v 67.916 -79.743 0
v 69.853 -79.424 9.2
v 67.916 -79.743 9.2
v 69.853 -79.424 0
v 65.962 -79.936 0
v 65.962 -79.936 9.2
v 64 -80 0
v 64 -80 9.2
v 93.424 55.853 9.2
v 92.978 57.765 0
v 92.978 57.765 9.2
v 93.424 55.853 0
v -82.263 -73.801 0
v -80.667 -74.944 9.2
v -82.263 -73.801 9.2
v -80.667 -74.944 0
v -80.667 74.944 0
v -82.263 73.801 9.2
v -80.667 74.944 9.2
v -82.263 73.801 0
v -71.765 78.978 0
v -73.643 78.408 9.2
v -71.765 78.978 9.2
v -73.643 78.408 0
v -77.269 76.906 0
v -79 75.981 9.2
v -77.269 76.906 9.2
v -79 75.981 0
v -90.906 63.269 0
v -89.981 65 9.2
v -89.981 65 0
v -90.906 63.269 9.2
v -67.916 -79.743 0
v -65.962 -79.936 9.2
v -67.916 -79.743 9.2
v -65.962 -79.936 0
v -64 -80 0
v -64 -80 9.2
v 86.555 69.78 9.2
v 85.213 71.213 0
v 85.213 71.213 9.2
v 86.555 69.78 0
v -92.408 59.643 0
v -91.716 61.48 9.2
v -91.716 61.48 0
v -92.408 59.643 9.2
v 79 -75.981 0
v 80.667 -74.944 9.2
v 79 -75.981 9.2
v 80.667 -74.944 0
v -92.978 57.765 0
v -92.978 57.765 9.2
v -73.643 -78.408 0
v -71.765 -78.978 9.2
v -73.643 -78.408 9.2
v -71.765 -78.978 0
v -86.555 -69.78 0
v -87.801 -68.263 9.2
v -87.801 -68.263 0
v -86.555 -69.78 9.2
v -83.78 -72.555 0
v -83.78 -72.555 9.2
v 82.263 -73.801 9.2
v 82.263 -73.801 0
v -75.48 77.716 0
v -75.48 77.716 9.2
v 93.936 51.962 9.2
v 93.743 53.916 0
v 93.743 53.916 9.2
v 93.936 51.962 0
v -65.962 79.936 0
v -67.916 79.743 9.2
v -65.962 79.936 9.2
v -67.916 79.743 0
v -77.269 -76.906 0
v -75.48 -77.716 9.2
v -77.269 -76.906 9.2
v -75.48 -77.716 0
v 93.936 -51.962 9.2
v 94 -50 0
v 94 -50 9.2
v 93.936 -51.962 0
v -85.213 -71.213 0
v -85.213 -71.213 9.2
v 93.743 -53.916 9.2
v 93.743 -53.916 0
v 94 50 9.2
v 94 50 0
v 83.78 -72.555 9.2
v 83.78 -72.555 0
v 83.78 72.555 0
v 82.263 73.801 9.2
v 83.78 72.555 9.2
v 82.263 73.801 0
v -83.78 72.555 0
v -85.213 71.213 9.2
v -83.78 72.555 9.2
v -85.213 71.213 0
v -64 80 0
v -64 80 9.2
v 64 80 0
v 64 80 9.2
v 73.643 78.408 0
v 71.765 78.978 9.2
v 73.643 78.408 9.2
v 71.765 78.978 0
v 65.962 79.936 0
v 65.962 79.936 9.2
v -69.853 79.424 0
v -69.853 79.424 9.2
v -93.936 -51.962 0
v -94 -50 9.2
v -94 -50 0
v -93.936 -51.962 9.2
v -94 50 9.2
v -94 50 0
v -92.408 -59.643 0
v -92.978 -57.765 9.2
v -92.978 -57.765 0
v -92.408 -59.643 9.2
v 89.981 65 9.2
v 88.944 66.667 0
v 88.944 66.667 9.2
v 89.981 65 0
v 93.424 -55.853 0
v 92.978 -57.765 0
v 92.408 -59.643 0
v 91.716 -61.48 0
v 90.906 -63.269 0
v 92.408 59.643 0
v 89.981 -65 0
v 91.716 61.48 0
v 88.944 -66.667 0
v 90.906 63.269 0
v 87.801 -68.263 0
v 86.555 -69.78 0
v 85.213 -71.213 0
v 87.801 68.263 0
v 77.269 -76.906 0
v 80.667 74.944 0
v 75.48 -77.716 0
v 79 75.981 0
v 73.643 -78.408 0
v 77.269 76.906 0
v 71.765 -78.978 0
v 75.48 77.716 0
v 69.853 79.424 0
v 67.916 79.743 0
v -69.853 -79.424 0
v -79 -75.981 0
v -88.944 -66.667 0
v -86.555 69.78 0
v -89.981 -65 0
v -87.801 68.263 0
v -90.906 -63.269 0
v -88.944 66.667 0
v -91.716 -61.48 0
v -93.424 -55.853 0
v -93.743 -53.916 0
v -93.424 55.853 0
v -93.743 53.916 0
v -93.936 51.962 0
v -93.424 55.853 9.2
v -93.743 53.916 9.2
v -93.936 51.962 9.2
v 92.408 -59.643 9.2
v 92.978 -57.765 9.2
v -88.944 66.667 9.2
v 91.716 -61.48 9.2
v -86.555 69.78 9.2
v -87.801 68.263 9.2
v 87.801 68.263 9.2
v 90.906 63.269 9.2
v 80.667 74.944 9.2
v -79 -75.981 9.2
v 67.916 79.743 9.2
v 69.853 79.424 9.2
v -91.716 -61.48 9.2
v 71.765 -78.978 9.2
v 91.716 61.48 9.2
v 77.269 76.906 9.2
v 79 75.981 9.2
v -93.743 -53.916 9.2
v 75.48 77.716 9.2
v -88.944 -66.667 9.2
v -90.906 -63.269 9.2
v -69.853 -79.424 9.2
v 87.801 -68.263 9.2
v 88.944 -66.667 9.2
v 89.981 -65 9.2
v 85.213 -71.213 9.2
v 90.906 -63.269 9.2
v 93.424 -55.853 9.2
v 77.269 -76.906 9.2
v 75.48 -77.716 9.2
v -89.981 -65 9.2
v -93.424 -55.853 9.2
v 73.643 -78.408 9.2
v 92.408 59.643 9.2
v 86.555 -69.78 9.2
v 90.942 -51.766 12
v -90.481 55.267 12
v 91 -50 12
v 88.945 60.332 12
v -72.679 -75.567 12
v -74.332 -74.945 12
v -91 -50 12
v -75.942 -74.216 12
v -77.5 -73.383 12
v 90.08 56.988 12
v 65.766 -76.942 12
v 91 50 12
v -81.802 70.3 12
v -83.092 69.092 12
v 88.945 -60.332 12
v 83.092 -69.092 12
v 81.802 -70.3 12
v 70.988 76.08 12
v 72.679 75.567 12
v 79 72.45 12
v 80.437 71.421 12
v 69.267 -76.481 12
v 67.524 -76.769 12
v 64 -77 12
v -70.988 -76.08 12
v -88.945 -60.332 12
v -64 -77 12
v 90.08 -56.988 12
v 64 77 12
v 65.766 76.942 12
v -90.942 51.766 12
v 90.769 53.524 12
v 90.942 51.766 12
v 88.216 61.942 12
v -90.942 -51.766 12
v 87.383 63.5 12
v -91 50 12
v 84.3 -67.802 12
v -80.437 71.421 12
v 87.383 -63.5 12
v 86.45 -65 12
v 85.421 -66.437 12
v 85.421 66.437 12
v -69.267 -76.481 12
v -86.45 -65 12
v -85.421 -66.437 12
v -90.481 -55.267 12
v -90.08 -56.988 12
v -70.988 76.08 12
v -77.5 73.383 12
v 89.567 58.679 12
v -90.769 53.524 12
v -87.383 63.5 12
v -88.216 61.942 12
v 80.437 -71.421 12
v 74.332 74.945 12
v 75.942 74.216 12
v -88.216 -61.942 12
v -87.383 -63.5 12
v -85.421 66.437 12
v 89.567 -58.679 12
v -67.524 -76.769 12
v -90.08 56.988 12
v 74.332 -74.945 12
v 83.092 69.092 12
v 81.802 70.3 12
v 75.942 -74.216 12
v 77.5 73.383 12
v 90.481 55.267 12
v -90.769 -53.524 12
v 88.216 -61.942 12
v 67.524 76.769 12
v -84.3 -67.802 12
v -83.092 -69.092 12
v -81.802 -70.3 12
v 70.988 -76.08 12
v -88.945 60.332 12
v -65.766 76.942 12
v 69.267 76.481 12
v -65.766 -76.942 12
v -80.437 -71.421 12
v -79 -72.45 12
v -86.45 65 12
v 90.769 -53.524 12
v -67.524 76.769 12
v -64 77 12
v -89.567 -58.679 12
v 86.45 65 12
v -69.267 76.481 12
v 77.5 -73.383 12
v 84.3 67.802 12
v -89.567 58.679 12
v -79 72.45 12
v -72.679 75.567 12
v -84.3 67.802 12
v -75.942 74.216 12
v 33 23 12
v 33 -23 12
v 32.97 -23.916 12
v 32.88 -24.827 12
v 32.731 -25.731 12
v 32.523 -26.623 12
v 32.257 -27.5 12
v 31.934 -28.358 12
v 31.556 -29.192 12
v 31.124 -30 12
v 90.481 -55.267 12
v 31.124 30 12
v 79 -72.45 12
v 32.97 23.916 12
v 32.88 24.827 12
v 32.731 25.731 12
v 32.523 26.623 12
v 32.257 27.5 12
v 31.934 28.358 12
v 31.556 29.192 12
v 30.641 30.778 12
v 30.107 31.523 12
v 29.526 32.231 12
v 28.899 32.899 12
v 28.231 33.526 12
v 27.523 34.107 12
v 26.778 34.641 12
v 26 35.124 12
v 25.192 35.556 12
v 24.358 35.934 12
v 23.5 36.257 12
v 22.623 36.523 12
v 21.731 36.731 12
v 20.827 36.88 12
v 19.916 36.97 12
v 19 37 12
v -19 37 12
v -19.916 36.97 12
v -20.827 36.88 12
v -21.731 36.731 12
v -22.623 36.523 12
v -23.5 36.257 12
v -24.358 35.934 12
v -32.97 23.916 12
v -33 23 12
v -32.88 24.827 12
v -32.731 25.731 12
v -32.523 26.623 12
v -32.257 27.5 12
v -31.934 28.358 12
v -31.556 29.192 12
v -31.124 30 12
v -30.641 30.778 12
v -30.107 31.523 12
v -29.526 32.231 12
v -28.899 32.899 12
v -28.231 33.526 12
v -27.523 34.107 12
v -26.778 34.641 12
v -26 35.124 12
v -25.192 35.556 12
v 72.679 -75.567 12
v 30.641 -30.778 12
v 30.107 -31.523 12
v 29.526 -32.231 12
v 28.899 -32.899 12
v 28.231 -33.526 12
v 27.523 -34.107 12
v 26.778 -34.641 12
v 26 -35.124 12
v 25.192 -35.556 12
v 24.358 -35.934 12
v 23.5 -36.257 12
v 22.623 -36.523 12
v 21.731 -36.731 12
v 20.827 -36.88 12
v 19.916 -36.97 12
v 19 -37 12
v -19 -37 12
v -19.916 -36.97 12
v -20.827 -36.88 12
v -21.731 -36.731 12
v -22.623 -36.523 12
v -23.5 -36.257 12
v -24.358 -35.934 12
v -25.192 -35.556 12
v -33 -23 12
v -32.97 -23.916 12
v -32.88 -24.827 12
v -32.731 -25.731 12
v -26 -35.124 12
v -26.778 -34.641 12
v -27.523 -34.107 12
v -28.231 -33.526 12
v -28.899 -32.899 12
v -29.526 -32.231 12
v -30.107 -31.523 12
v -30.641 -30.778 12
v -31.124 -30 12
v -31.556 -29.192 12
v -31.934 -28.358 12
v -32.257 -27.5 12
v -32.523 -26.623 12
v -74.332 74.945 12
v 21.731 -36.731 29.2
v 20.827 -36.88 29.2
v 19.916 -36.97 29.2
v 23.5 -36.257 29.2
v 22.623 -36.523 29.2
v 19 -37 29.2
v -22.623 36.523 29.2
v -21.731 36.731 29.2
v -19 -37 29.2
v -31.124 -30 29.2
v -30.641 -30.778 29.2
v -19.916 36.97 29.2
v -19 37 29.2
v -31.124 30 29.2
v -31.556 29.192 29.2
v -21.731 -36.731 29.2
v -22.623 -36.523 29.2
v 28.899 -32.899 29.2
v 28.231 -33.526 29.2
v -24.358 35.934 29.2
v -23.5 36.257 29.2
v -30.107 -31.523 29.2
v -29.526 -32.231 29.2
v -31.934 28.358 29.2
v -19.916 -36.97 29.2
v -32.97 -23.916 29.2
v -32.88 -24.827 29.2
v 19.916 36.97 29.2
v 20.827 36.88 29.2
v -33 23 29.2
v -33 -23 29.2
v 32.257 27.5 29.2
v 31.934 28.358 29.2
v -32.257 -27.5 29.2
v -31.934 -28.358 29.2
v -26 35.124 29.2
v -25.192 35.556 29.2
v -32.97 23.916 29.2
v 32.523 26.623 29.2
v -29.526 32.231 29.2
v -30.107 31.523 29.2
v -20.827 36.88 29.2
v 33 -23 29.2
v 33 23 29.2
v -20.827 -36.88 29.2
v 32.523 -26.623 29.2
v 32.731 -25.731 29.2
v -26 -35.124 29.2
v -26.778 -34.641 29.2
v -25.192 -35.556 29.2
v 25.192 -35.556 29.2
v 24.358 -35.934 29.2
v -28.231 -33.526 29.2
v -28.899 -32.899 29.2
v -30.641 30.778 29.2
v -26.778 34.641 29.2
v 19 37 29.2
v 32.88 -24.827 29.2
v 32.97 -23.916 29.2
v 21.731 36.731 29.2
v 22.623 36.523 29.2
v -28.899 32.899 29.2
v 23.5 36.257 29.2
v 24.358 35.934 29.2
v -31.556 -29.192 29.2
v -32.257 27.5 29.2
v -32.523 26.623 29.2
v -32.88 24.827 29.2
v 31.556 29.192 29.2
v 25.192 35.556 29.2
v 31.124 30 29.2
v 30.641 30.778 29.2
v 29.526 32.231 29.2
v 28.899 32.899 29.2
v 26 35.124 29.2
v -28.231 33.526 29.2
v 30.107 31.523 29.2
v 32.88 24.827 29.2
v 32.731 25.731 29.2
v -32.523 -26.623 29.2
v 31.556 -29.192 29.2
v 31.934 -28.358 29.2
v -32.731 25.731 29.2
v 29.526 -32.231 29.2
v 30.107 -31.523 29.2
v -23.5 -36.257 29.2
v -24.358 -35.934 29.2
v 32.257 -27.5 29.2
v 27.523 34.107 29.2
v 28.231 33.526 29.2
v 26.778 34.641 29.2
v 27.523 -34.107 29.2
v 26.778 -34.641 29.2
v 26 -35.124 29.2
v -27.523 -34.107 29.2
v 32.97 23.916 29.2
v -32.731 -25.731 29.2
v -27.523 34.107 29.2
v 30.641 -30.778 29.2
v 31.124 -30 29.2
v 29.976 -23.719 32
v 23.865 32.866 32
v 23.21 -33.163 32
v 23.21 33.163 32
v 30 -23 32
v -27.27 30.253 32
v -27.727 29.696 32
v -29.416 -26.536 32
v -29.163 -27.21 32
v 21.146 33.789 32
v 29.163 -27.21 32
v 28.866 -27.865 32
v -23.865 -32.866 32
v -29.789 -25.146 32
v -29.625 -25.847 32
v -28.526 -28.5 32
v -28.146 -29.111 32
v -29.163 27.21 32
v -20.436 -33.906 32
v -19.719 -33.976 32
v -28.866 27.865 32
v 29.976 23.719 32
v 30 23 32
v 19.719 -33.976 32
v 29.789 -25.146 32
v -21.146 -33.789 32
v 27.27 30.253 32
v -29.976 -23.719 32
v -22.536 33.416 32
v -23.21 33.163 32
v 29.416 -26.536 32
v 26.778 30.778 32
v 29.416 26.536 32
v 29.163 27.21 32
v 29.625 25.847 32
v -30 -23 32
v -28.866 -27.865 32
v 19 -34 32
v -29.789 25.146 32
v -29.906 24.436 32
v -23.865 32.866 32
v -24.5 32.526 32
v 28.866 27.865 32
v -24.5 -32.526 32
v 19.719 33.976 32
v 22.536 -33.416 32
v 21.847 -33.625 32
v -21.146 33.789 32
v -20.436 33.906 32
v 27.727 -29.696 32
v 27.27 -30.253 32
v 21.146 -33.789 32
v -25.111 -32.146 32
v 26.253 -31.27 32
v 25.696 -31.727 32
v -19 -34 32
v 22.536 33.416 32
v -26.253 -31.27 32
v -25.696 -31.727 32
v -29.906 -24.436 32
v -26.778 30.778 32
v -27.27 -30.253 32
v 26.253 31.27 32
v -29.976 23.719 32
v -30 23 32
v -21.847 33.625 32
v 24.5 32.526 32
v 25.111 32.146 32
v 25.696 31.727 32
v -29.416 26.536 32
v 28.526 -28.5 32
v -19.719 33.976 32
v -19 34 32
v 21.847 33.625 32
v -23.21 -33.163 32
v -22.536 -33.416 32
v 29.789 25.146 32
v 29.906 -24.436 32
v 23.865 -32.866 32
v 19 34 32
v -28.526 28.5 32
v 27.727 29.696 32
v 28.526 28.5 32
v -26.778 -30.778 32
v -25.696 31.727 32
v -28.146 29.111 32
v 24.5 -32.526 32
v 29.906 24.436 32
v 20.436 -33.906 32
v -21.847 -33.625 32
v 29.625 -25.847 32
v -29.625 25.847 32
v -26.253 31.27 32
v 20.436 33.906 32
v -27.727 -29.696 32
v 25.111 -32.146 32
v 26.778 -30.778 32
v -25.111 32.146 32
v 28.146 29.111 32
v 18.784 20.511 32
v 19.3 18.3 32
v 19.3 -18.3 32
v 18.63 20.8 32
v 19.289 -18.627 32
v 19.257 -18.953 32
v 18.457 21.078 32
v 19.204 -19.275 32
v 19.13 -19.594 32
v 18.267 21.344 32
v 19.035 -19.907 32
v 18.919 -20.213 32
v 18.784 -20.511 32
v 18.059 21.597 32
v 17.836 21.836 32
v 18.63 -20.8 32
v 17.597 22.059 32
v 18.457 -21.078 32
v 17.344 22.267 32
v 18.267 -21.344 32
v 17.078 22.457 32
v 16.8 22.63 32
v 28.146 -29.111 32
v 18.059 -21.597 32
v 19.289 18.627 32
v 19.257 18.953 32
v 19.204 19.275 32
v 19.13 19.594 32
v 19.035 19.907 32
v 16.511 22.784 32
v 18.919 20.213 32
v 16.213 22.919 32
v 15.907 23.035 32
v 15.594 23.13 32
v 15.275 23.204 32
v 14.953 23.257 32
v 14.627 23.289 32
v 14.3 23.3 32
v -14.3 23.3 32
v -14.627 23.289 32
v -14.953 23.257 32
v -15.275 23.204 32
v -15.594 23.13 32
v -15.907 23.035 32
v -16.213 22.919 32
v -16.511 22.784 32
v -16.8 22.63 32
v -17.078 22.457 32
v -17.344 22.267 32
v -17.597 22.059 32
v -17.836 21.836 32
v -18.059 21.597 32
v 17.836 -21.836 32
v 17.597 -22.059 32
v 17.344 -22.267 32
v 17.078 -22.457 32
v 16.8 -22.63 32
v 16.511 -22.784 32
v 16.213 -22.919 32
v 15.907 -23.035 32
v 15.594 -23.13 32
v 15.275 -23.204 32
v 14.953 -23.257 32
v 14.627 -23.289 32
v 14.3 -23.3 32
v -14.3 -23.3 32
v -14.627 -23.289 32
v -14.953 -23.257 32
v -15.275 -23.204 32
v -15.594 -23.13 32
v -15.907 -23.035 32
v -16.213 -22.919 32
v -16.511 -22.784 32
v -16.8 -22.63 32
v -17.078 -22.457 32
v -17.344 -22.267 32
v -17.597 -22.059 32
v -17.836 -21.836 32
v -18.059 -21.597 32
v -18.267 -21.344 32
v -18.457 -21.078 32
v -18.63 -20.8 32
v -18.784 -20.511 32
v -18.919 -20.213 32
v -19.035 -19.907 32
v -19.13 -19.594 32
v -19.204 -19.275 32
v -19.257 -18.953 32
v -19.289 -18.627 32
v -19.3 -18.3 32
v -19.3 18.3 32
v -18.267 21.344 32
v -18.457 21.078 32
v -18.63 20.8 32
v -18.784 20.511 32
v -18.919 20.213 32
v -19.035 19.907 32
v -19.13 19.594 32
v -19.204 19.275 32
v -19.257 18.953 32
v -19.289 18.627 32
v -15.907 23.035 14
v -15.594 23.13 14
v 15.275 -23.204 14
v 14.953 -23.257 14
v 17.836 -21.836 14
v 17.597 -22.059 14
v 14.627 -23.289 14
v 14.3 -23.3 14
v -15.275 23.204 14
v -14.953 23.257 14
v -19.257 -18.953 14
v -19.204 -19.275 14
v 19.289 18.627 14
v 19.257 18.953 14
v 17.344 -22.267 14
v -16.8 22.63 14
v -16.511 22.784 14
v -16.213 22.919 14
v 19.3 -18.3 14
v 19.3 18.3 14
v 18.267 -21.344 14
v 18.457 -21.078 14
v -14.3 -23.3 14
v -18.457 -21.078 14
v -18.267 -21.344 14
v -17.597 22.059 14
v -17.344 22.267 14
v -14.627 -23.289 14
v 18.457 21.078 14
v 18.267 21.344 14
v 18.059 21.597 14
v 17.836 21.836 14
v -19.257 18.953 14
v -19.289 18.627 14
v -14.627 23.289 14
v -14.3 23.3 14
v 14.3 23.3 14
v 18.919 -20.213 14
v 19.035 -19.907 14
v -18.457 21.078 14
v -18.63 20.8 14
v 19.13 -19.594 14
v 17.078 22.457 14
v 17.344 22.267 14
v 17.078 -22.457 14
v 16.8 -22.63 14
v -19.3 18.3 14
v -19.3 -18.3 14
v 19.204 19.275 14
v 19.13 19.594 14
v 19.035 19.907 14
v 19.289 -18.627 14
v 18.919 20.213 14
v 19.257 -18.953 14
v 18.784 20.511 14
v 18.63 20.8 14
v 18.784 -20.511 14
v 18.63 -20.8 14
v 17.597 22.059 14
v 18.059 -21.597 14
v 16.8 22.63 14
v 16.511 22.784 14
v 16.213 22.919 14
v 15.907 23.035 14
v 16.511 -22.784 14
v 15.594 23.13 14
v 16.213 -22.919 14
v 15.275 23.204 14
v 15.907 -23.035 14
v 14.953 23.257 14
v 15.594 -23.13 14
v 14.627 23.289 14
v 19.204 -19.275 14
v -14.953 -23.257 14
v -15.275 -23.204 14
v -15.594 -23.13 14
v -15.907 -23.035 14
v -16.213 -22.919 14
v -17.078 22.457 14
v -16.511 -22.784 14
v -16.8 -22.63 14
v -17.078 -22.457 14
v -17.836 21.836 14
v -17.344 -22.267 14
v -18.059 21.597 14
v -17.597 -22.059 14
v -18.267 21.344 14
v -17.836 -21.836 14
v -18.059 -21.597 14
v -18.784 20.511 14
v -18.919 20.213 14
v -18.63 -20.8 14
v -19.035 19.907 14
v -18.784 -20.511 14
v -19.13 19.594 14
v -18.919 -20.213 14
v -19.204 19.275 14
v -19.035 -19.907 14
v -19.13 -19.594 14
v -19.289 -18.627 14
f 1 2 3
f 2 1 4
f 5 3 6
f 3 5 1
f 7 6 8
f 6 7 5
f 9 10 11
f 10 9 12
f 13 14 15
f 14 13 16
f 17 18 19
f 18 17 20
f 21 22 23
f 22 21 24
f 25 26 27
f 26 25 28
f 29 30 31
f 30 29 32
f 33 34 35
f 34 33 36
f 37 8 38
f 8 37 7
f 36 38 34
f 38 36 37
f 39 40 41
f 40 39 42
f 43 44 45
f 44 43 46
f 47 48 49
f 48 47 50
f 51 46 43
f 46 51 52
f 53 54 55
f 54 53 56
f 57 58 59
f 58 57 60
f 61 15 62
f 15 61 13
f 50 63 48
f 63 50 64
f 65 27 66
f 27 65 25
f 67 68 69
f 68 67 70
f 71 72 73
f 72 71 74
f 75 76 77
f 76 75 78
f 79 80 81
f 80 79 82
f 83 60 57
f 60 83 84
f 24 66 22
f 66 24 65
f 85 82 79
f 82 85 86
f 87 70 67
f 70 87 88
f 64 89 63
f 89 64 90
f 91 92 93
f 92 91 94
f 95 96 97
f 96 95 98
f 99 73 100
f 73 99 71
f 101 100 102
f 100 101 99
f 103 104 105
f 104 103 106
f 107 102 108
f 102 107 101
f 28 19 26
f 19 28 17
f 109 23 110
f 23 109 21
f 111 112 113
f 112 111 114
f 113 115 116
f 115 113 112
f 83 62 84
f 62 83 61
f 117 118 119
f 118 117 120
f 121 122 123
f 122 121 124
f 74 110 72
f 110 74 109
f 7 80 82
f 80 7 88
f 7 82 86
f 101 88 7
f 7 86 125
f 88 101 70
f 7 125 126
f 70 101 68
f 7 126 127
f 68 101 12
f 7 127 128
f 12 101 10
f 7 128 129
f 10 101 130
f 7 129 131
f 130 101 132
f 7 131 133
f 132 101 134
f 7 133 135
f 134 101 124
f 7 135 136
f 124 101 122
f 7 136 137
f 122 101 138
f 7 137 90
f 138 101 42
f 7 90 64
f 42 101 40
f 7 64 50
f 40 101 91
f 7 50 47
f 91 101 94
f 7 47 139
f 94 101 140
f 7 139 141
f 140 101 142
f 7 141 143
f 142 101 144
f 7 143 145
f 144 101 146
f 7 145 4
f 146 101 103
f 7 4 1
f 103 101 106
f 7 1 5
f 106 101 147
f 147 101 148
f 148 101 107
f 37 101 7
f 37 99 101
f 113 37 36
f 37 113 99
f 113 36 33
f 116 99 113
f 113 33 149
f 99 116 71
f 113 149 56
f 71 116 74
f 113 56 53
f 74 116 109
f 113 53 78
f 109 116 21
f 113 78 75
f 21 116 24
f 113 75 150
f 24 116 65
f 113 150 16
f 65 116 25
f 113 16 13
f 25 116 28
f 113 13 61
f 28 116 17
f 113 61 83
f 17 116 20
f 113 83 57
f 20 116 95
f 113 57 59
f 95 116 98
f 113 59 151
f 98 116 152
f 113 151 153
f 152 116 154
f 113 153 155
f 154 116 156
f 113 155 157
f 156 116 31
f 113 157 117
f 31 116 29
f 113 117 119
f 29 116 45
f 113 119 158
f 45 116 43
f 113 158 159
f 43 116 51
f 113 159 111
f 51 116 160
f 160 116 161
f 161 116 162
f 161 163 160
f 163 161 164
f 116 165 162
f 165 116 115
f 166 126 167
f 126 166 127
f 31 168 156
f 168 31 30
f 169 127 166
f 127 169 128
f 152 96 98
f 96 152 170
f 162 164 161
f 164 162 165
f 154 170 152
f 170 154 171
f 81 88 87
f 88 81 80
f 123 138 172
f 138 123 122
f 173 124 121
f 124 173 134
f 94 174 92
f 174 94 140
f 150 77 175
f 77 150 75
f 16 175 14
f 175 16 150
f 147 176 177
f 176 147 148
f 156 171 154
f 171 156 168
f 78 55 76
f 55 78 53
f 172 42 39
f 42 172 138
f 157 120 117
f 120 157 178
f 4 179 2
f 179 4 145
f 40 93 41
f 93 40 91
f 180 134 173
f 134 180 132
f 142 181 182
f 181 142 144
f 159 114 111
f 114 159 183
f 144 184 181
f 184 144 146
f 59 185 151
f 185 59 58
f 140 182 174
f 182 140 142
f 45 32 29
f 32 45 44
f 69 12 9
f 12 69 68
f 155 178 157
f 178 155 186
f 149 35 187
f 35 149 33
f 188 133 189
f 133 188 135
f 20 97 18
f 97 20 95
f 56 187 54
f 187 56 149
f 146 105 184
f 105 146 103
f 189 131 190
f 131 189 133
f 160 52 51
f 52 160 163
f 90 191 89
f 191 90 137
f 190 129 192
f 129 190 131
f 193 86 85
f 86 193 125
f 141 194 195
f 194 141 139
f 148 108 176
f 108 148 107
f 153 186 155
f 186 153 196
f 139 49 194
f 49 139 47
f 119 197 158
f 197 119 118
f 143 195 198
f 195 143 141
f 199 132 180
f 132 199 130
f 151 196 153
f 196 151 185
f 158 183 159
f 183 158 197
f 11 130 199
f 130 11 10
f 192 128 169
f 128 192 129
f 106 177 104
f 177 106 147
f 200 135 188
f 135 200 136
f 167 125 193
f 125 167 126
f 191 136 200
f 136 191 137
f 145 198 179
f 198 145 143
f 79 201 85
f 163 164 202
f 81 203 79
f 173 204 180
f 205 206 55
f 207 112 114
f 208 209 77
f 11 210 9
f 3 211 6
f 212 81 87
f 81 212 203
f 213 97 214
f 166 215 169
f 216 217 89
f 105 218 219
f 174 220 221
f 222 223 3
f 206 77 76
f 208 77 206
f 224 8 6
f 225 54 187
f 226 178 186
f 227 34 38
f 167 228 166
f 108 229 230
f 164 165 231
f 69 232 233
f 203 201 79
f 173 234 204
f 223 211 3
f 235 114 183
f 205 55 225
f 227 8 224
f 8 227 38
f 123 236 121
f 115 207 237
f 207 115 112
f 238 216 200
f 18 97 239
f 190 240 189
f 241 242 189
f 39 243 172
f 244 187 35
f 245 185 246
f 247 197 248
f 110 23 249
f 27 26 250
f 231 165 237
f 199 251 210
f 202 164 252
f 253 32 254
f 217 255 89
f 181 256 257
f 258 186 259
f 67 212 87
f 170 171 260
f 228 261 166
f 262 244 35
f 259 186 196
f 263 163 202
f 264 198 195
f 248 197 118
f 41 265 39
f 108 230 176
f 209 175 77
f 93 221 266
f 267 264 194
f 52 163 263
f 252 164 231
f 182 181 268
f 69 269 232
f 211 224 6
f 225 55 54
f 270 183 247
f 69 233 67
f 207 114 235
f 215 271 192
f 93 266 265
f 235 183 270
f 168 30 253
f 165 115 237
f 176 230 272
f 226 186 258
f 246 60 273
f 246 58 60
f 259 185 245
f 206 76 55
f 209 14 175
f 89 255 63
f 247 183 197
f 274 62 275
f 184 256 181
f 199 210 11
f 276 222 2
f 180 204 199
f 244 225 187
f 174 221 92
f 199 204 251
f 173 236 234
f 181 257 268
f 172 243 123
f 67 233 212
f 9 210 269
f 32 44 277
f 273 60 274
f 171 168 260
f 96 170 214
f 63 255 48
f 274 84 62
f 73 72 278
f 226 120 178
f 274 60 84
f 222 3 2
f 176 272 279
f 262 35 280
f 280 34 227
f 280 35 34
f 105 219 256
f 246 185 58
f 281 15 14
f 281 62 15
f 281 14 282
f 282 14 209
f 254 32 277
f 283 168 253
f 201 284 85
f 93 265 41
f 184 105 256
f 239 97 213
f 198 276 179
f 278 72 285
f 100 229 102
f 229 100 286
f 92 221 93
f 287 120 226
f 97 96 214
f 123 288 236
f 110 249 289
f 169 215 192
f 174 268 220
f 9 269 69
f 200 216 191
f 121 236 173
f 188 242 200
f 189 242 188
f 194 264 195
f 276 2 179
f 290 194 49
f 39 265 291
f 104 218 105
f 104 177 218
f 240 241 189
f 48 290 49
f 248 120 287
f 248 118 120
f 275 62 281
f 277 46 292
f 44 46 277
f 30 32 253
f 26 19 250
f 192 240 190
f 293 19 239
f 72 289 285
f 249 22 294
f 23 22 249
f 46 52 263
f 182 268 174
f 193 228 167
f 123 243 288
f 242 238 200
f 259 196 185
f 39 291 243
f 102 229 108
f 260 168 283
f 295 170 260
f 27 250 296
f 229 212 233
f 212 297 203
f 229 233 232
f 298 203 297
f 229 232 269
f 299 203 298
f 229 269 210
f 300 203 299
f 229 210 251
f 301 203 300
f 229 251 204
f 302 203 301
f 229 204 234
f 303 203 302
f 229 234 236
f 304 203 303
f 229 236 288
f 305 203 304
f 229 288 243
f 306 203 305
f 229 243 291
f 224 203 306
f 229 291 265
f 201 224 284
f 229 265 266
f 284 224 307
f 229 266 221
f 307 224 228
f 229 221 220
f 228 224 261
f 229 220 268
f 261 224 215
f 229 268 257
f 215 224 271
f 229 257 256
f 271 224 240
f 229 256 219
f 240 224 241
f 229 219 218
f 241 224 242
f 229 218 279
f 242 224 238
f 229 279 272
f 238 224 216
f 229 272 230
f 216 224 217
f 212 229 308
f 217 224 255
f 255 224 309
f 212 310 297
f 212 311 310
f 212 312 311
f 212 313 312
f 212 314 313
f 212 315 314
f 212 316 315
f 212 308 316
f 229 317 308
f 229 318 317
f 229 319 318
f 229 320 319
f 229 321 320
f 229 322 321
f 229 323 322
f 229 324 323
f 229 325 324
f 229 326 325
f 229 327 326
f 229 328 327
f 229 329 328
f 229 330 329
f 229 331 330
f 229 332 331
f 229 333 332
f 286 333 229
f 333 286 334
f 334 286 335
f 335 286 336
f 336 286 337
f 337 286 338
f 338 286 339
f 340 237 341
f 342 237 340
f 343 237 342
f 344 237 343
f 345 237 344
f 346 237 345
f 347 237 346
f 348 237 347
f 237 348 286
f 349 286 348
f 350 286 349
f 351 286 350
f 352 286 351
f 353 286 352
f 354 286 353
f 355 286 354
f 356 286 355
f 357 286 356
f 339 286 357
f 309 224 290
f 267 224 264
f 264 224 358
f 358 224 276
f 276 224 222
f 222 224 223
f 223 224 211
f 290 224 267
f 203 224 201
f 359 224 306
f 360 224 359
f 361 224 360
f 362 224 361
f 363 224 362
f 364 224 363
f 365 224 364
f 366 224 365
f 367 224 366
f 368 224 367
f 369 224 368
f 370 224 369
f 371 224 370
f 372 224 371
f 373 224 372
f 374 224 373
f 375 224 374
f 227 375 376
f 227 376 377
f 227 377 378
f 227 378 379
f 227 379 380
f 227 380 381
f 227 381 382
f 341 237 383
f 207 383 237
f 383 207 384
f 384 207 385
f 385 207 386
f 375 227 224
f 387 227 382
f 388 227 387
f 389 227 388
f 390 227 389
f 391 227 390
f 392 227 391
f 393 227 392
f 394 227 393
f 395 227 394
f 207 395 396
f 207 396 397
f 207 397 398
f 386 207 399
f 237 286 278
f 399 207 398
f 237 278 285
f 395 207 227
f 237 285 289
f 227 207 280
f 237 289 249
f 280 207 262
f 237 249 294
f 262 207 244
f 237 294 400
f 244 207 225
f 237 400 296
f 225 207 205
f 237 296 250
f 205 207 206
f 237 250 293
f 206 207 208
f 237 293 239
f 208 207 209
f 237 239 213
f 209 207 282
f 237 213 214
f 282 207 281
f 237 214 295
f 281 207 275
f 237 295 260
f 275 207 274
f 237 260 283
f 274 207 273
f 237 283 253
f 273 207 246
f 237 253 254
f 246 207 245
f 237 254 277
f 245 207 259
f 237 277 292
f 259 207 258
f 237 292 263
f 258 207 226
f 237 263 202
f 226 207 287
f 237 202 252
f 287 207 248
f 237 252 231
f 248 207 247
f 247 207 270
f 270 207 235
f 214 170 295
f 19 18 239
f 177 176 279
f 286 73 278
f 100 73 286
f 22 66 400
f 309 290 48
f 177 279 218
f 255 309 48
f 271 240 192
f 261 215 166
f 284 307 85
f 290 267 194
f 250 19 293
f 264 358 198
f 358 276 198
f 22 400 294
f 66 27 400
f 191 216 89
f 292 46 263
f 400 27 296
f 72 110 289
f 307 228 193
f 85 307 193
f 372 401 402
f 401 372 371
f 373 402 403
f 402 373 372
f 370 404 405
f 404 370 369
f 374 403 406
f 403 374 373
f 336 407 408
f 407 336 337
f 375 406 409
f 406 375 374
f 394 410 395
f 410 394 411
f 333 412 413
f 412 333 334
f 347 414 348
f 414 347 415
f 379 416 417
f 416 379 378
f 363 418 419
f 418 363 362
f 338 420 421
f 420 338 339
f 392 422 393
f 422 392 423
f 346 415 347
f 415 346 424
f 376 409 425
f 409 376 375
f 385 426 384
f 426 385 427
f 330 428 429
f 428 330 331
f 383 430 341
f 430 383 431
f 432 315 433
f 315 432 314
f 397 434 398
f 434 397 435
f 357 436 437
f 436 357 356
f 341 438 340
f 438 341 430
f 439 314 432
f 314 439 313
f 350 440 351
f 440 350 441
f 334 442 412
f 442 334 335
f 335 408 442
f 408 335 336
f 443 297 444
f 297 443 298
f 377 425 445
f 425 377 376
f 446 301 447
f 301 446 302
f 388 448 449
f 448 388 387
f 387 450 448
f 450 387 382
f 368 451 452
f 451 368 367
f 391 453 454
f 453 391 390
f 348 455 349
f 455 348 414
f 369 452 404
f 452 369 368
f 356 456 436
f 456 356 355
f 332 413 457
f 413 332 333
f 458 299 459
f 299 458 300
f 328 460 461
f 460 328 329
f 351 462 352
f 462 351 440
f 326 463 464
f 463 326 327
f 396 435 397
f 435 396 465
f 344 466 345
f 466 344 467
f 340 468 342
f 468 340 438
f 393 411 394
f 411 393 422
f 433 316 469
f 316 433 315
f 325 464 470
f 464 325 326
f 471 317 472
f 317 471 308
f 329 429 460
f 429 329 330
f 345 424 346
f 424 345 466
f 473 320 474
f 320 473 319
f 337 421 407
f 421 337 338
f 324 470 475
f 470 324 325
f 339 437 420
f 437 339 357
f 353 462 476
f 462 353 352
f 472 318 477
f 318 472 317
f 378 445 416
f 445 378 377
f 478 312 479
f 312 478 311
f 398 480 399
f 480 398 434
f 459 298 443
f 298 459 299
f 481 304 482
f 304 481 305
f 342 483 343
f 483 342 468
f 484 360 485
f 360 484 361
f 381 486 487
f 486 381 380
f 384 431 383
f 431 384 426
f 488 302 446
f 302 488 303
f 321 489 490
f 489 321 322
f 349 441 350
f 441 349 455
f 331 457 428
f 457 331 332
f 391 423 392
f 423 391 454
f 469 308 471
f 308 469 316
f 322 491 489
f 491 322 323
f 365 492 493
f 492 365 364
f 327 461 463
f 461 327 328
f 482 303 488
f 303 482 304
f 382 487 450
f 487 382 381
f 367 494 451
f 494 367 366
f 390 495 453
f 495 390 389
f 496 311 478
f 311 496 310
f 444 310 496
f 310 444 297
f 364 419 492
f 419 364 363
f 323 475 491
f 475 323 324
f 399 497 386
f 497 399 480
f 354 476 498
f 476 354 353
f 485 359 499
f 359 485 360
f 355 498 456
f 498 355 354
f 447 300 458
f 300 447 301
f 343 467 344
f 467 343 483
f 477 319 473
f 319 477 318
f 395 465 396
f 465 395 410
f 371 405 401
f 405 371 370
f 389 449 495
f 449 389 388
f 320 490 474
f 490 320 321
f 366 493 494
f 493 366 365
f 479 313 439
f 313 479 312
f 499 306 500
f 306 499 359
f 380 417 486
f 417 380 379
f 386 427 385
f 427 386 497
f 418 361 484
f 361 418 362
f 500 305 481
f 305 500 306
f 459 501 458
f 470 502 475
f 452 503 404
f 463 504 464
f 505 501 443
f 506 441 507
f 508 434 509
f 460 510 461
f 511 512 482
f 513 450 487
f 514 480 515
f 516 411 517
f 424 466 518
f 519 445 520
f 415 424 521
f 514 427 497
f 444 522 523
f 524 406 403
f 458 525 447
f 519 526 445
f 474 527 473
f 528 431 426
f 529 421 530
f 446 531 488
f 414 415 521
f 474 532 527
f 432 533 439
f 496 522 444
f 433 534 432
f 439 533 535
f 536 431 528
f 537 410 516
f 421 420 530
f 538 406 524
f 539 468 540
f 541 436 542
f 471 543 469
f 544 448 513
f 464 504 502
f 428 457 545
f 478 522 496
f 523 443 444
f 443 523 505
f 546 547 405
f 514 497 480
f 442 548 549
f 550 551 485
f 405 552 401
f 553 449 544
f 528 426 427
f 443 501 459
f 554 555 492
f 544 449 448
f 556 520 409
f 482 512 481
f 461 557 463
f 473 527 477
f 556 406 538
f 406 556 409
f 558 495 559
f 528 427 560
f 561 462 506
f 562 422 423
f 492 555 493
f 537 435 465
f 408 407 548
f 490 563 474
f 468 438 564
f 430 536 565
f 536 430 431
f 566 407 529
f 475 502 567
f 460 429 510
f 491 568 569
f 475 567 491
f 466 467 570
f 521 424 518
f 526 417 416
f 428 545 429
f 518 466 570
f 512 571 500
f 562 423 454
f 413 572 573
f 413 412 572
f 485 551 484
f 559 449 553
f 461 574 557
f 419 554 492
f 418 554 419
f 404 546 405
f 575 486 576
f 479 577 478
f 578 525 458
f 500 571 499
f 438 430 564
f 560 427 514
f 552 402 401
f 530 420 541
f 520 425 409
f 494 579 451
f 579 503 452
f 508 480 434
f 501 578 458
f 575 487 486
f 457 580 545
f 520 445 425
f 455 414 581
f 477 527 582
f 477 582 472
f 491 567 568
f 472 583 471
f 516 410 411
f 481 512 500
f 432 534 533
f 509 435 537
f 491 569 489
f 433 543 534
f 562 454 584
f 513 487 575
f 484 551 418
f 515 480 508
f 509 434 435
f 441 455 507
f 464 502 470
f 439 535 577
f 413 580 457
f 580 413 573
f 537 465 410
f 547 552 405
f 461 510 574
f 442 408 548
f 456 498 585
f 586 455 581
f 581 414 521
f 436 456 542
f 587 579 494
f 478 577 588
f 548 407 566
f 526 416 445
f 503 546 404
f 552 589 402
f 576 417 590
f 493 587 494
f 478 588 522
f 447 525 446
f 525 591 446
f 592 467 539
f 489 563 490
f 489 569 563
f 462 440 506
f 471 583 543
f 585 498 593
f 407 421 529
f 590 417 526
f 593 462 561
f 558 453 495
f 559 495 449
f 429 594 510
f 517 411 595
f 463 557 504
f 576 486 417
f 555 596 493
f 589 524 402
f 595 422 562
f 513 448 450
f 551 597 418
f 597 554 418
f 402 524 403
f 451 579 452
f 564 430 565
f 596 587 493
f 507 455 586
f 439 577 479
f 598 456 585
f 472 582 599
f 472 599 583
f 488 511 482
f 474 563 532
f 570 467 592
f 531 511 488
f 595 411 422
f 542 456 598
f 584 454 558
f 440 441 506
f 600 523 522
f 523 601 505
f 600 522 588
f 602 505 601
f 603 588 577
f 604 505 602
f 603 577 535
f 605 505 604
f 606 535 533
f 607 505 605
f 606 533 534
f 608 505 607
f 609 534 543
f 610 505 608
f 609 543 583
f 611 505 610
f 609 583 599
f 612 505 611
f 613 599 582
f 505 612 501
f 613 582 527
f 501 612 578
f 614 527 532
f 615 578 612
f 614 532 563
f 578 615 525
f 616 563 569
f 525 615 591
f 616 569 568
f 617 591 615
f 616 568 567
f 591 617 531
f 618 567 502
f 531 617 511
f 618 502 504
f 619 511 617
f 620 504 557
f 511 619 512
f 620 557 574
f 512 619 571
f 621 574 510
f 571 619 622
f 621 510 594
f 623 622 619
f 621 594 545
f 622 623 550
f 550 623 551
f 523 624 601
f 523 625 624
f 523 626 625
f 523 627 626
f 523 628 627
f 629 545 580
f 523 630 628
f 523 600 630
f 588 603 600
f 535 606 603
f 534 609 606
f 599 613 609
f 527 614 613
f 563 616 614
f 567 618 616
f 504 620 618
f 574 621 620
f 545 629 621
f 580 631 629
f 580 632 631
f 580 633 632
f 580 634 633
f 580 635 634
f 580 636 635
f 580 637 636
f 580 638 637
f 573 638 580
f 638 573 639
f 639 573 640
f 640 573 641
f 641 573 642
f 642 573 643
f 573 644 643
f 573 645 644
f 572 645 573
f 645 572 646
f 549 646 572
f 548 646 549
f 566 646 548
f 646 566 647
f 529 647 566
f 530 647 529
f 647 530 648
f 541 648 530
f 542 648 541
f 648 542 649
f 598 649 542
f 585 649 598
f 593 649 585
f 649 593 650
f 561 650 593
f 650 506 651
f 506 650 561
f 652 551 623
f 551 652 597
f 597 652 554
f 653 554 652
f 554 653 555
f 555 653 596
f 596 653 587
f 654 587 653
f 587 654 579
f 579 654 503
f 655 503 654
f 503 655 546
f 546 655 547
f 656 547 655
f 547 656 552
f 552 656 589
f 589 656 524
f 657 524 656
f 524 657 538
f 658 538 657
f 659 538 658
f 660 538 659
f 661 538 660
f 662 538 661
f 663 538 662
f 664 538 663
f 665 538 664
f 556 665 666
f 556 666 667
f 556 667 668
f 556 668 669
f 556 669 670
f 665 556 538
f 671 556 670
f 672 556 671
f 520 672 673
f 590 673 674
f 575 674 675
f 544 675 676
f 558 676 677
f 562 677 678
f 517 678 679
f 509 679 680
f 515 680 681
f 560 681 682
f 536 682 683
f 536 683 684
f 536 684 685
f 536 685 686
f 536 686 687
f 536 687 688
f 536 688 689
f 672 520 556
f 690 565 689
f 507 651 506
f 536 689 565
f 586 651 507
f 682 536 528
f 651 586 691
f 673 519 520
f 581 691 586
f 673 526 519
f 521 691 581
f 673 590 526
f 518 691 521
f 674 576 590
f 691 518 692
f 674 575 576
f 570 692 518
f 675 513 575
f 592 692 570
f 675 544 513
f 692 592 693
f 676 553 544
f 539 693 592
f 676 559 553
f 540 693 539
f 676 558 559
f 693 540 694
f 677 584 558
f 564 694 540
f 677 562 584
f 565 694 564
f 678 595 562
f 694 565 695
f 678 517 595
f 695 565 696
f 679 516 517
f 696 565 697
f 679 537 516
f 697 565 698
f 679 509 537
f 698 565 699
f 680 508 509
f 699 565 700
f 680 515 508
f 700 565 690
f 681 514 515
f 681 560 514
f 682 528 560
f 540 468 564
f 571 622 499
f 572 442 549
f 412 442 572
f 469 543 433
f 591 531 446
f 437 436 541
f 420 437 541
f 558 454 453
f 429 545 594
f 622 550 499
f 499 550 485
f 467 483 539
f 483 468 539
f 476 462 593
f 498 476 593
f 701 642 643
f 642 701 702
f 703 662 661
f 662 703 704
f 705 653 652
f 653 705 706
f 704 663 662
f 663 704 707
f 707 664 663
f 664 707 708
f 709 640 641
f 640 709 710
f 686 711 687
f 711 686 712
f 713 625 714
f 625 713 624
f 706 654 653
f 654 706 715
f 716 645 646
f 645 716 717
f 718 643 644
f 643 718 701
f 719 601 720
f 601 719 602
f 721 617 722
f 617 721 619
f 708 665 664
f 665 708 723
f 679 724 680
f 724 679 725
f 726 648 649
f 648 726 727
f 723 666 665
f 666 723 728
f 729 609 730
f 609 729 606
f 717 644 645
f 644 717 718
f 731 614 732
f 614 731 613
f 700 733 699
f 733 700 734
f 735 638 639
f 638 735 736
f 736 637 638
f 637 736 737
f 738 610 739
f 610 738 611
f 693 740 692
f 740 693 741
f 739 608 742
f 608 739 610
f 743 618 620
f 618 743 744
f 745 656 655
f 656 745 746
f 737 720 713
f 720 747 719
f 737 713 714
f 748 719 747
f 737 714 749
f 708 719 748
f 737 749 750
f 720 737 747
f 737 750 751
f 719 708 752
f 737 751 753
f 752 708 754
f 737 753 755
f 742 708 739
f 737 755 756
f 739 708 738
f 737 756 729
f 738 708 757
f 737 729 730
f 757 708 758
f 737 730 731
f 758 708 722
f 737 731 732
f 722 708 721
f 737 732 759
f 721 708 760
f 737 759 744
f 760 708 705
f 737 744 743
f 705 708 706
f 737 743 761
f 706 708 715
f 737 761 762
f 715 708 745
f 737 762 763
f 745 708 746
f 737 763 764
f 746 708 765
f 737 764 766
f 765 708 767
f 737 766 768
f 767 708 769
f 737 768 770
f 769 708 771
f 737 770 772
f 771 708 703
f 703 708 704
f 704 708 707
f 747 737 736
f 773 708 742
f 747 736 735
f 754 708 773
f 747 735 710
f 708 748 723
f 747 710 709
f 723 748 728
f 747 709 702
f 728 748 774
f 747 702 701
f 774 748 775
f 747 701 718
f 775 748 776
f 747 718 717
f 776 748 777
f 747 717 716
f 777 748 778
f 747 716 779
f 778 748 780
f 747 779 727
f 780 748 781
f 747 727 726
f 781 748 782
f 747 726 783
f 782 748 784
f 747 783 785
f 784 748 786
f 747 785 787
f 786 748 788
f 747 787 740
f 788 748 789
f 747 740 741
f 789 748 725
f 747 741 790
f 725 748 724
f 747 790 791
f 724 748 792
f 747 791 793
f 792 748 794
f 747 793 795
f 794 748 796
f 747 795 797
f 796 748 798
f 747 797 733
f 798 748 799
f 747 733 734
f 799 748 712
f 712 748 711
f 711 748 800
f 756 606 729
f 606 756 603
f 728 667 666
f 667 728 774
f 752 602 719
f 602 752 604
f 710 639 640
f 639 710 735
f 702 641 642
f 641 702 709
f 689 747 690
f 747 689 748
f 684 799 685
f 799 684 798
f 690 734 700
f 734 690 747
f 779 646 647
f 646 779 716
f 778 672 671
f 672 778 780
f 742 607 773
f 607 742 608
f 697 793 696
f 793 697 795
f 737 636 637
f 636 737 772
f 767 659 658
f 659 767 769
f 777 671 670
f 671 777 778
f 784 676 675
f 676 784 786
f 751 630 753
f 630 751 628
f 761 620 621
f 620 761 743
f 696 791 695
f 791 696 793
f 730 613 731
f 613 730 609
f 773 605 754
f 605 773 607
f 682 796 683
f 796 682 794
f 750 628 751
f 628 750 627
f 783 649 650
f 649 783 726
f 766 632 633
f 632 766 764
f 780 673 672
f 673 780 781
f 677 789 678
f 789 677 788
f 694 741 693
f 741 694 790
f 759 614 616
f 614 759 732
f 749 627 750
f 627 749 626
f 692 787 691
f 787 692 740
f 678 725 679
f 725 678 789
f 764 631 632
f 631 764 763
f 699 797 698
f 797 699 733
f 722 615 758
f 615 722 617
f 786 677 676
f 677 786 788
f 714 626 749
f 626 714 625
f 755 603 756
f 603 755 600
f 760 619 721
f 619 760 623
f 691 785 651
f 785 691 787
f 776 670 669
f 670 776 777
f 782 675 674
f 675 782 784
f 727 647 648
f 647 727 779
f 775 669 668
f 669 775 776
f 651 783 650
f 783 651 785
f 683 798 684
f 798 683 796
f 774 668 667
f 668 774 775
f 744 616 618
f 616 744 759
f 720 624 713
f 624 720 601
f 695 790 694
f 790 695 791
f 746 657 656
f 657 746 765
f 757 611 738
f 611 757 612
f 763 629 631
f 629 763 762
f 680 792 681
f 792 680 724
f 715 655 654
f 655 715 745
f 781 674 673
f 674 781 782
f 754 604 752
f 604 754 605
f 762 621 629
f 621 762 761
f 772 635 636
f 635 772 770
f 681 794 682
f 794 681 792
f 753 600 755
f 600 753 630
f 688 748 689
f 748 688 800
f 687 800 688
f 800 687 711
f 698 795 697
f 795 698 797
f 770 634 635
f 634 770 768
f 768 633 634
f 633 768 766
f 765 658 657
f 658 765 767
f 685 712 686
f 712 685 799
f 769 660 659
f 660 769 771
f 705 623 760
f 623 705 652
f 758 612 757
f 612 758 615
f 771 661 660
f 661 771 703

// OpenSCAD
// Headphone stand in three printable parts: base, post, hanger.
// No glue, no screws. Rectangular (non-round) blade tenons prevent spinning.
// All dimensions in mm. Print orientation is the exported orientation (+Z up).
//
// Assembly heights (assembly coordinates, desk at z=0):
//   base plate/boss top        0 .. 32
//   post                       14.5 .. 250  (17.5 mm of it inside the base socket)
//   hanger tenon               228.5 .. 250 (21.5 mm inside the post socket)
//   hanger saddle top centre   270
// Socket clearances: 0.3 mm per side (socket is tenon + 0.6 in each dimension),
// tenon tips stop 0.5 mm above socket floors; shoulders/faces give the depth stop
// for the hanger, and the post bottoms in its socket.

part = "base"; // [base, post, hanger, assembly]
cadverify_only = "";

$fn = 96;

/* [Base] */
base_w = 188;          // desk footprint, X
base_d = 160;          // desk footprint, Y
base_plate_top = 9;    // straight plate wall up to here, then 45 deg chamfer to 12
base_top_plate = 12;
boss_w = 66;
boss_d = 74;
boss_straight_top = 29; // then 45 deg chamfer to boss_top
boss_top = 32;
base_socket_w = 38.6;  // post 38 + 0.6
base_socket_d = 46.6;  // post 46 + 0.6
base_socket_floor = 14;

/* [Post] */
post_w = 38;
post_d = 46;
post_len = 235.5;      // tip (local z=0) to top (assembly 250)
post_top_socket_w = 24.6; // hanger tenon 24 + 0.6
post_top_socket_d = 34.6; // hanger tenon 34 + 0.6
post_top_socket_floor_local = 213.5; // assembly 228

/* [Hanger, modelled in print coordinates] */
// Print coordinates: X = saddle length, Y = height above tenon tip,
// Z = saddle width direction (part lies on its Z=0 side face on the bed).
hang_len_half = 69;    // overall saddle half length incl. rounded end point
hang_width = 34;       // >= 30 mm headband support width
hang_top_rel = 41.5;   // tenon tip to saddle crown; assembly 228.5 + 41.5 = 270
hang_arc_r = 170;      // crown radius of the headband contact surface
hang_plate_t = 10;     // saddle plate thickness (vertical, in profile)
hang_tenon_half_w = 12;  // tenon is 24 (X) x 34 (width)
hang_shoulder_rel = 21.5; // assembly 250, post top
hang_neck_half_w = 17;

function hang_top_z(x) = hang_top_rel - (hang_arc_r - sqrt(hang_arc_r*hang_arc_r - x*x));
function hang_bot_z(x) = hang_top_z(x) - hang_plate_t;

module rounded_rect(w, d, r) {
    offset(r = r) square([w - 2*r, d - 2*r], center = true);
}

module instance(name, part_name, unit = 1) {
    echo(cadverify_instance = [name, part_name, unit]);
    if (cadverify_only == "" || cadverify_only == name) children();
}

/* ---------- BASE (print = assembly orientation) ---------- */
module base_part() {
    difference() {
        // Outer corners of the plate and boss are rounded in plan view (corner
        // radius >= 6 mm) and the top rims have 45 deg x 3 mm chamfers, so
        // nothing sticks out beyond the bounding box or the support plane.
        union() {
            // desk plate with 45 deg top edge chamfer
            linear_extrude(base_plate_top) rounded_rect(base_w, base_d, 30);
            hull() {
                translate([0, 0, base_plate_top]) linear_extrude(0.2)
                    rounded_rect(base_w, base_d, 30);
                translate([0, 0, base_top_plate - 0.2]) linear_extrude(0.2)
                    rounded_rect(base_w - 6, base_d - 6, 27);
            }
            // raised boss / collar around the post socket, 45 deg top chamfer
            translate([0, 0, base_top_plate])
                linear_extrude(boss_straight_top - base_top_plate)
                    rounded_rect(boss_w, boss_d, 14);
            hull() {
                translate([0, 0, boss_straight_top]) linear_extrude(0.2)
                    rounded_rect(boss_w, boss_d, 14);
                translate([0, 0, boss_top - 0.2]) linear_extrude(0.2)
                    rounded_rect(boss_w - 6, boss_d - 6, 11);
            }
        }
        // blind rectangular socket for the post (stops post spinning)
        translate([0, 0, base_socket_floor])
            linear_extrude(boss_top - base_socket_floor + 2)
                rounded_rect(base_socket_w, base_socket_d, 5);
    }
}

/* ---------- POST (printed upright, local z=0 is tenon tip) ---------- */
module post_part() {
    difference() {
        // Solid rectangular column, corners rounded 8 mm in plan view.
        linear_extrude(post_len) rounded_rect(post_w, post_d, 8);
        // Blind rectangular socket in the top for the hanger blade tenon:
        // tenon + 0.6 mm per side (0.3 mm clearance); the non-round rectangle
        // is what stops the hanger spinning on the post.
        translate([0, 0, post_top_socket_floor_local])
            linear_extrude(post_len - post_top_socket_floor_local + 2)
                rounded_rect(post_top_socket_w, post_top_socket_d, 5);
    }
}

/* ---------- HANGER (printed on its side) ---------- */
module hanger_part() {
    top_pts    = [for (x = [56 : -8 : -56]) [x, hang_top_z(x)]];
    bot_r_pts  = [for (x = [40 : 8 : 64]) [x, hang_bot_z(x)]];
    bot_l_pts  = [for (x = [-64 : 8 : -40]) [x, hang_bot_z(x)]];
    mid64 = (hang_top_z(64) + hang_bot_z(64)) / 2;
    // Saddle/neck profile above the shoulder plane (print y = hang_shoulder_rel).
    profile = concat(
        [[-hang_neck_half_w, hang_shoulder_rel], [hang_neck_half_w, hang_shoulder_rel],
         [30, hang_bot_z(30)]],
        bot_r_pts,
        [[hang_len_half - 0.5, mid64], [64, hang_top_z(64)]],
        top_pts,
        [[-64, hang_top_z(64)], [-(hang_len_half - 0.5), mid64], [-64, hang_bot_z(64)]],
        bot_l_pts,
        [[-30, hang_bot_z(30)]]
    );
    difference() {
        union() {
            linear_extrude(hang_width) polygon(profile);
            // Blade tenon below the shoulder: 24 x 34 with 4 mm corner radii,
            // so it clears the post socket's 5 mm rounded corners. It reaches
            // 2 mm up into the neck so the union is volumetric, not face-only.
            translate([0, 0, hang_width/2]) rotate([-90, 0, 0])
                linear_extrude(hang_shoulder_rel + 2)
                    rounded_rect(2*hang_tenon_half_w, hang_width, 4);
        }
        // 45 deg chamfers on the two crown side edges, limited to the central
        // contact zone |x| <= 36: the box spans start at x = +-36, meet at the
        // edge point (|x|, crown) = (36, hang_top_z(36)) and stop 3 mm inside
        // the crown (tangency point), so the chamfer widens the crown flat to
        // 3 mm at |x| = 36+ and the plate keeps full width beyond it.
        // far side: keeps Z + Y <= hang_top_z(36) + hang_width
        translate([0, hang_top_z(36) + hang_width, hang_width]) rotate([135, 0, 0])
            translate([-36, 0, 0]) cube([72, 40, 40]);
        // bed side: keeps Z - Y >= -hang_top_z(36)
        translate([0, hang_top_z(36), 0]) rotate([-135, 0, 0])
            translate([-36, 0, 0]) cube([72, 40, 40]);
    }
}

/* ---------- Spec echoes ---------- */
if (part == "base") {
    echo(cadverify_spec = [
        ["bounds", [[-base_w/2, -base_d/2, 0], [base_w/2, base_d/2, boss_top]]],
        ["bodies", 1],
        ["through_holes", 0],
        ["support_faces", [["desk", "-z", 25000]]],
        ["overhangs_allowed", []],
        ["copies", 1],
        ["details", [
            ["plate", "material", [[-80, -60, 2], [80, 60, 10]], 0.99],
            ["boss_wall", "material", [[22, -30, 16], [31, 30, 28]], 0.99],
            ["post_socket", "void", [[-17, -21, 16], [17, 21, 30]], 0.99],
            ["socket_floor", "thickness", [0, 0, 42], [0, 0, -1], base_socket_floor],
            ["boss_socket_top", "view", [[-34, -38, 27], [34, 38, boss_top]]]
        ]]
    ]);
} else if (part == "post") {
    echo(cadverify_spec = [
        ["bounds", [[-post_w/2, -post_d/2, 0], [post_w/2, post_d/2, post_len]]],
        ["bodies", 1],
        ["through_holes", 0],
        ["support_faces", [["bed", "-z", 1500]]],
        ["overhangs_allowed", []],
        ["copies", 1],
        ["details", [
            ["column", "material", [[-16, -20, 30], [16, 20, 200]], 0.99],
            ["hanger_socket", "void", [[-10, -15, 216], [10, 15, 234]], 0.99],
            ["column_width", "thickness", [32, 0, 100], [-1, 0, 0], post_w],
            ["top_socket", "view", [[-19, -23, 210], [19, 23, post_len]]]
        ]]
    ]);
} else if (part == "hanger") {
    // actual extreme points are the saddle end tips at +-(hang_len_half - 0.5)
    echo(cadverify_spec = [
        ["bounds", [[-(hang_len_half - 0.5), 0, 0], [hang_len_half - 0.5, hang_top_rel, hang_width]]],
        ["bodies", 1],
        ["through_holes", 0],
        ["support_faces", [["bed", "-z", 1200]]],
        ["overhangs_allowed", [
            ["45deg crown chamfer on bed side", [[-36, 37, 0], [36, hang_top_rel, 5]]]
        ]],
        ["copies", 1],
        ["details", [
            ["saddle_plate", "material", [[-25, 32, 5], [25, 38, 29]], 0.99],
            ["tenon", "material", [[-10, 2, 5], [10, 20, 29]], 0.99],
            ["saddle_thickness", "thickness", [50, 52, 17], [0, -1, 0], hang_plate_t],
            ["rounded_crown", "view", [[-40, 27, 0], [40, hang_top_rel, hang_width]]]
        ]]
    ]);
} else if (part == "assembly") {
    echo(cadverify_spec = [
        ["bounds", [[-base_w/2, -base_d/2, 0], [base_w/2, base_d/2, 270]]],
        ["support_faces", [["desk", "-z", 25000]]],
        ["allowed_interferences", []],
        ["assembly_order", [
            [["base"], [0, 0, 0]],
            [["post"], [0, 0, -1]],
            [["hanger"], [0, 0, -1]]
        ]]
    ]);
}

/* ---------- Output ---------- */
if (part == "base") {
    base_part();
} else if (part == "post") {
    post_part();
} else if (part == "hanger") {
    hanger_part();
} else if (part == "assembly") {
    instance("base", "base") base_part();
    instance("post", "post") translate([0, 0, 14.5]) post_part();
    // hanger print coords (x, y=height rel. tenon tip, z=width)
    //   -> assembly (x, 17-z, 228.5+y): tenon tip at 228.5, crown at 270
    instance("hanger", "hanger")
        translate([0, hang_width/2, 228.5]) rotate([90, 0, 0]) hanger_part();
} else {
    assert(false, str("unknown part: ", part));
}
